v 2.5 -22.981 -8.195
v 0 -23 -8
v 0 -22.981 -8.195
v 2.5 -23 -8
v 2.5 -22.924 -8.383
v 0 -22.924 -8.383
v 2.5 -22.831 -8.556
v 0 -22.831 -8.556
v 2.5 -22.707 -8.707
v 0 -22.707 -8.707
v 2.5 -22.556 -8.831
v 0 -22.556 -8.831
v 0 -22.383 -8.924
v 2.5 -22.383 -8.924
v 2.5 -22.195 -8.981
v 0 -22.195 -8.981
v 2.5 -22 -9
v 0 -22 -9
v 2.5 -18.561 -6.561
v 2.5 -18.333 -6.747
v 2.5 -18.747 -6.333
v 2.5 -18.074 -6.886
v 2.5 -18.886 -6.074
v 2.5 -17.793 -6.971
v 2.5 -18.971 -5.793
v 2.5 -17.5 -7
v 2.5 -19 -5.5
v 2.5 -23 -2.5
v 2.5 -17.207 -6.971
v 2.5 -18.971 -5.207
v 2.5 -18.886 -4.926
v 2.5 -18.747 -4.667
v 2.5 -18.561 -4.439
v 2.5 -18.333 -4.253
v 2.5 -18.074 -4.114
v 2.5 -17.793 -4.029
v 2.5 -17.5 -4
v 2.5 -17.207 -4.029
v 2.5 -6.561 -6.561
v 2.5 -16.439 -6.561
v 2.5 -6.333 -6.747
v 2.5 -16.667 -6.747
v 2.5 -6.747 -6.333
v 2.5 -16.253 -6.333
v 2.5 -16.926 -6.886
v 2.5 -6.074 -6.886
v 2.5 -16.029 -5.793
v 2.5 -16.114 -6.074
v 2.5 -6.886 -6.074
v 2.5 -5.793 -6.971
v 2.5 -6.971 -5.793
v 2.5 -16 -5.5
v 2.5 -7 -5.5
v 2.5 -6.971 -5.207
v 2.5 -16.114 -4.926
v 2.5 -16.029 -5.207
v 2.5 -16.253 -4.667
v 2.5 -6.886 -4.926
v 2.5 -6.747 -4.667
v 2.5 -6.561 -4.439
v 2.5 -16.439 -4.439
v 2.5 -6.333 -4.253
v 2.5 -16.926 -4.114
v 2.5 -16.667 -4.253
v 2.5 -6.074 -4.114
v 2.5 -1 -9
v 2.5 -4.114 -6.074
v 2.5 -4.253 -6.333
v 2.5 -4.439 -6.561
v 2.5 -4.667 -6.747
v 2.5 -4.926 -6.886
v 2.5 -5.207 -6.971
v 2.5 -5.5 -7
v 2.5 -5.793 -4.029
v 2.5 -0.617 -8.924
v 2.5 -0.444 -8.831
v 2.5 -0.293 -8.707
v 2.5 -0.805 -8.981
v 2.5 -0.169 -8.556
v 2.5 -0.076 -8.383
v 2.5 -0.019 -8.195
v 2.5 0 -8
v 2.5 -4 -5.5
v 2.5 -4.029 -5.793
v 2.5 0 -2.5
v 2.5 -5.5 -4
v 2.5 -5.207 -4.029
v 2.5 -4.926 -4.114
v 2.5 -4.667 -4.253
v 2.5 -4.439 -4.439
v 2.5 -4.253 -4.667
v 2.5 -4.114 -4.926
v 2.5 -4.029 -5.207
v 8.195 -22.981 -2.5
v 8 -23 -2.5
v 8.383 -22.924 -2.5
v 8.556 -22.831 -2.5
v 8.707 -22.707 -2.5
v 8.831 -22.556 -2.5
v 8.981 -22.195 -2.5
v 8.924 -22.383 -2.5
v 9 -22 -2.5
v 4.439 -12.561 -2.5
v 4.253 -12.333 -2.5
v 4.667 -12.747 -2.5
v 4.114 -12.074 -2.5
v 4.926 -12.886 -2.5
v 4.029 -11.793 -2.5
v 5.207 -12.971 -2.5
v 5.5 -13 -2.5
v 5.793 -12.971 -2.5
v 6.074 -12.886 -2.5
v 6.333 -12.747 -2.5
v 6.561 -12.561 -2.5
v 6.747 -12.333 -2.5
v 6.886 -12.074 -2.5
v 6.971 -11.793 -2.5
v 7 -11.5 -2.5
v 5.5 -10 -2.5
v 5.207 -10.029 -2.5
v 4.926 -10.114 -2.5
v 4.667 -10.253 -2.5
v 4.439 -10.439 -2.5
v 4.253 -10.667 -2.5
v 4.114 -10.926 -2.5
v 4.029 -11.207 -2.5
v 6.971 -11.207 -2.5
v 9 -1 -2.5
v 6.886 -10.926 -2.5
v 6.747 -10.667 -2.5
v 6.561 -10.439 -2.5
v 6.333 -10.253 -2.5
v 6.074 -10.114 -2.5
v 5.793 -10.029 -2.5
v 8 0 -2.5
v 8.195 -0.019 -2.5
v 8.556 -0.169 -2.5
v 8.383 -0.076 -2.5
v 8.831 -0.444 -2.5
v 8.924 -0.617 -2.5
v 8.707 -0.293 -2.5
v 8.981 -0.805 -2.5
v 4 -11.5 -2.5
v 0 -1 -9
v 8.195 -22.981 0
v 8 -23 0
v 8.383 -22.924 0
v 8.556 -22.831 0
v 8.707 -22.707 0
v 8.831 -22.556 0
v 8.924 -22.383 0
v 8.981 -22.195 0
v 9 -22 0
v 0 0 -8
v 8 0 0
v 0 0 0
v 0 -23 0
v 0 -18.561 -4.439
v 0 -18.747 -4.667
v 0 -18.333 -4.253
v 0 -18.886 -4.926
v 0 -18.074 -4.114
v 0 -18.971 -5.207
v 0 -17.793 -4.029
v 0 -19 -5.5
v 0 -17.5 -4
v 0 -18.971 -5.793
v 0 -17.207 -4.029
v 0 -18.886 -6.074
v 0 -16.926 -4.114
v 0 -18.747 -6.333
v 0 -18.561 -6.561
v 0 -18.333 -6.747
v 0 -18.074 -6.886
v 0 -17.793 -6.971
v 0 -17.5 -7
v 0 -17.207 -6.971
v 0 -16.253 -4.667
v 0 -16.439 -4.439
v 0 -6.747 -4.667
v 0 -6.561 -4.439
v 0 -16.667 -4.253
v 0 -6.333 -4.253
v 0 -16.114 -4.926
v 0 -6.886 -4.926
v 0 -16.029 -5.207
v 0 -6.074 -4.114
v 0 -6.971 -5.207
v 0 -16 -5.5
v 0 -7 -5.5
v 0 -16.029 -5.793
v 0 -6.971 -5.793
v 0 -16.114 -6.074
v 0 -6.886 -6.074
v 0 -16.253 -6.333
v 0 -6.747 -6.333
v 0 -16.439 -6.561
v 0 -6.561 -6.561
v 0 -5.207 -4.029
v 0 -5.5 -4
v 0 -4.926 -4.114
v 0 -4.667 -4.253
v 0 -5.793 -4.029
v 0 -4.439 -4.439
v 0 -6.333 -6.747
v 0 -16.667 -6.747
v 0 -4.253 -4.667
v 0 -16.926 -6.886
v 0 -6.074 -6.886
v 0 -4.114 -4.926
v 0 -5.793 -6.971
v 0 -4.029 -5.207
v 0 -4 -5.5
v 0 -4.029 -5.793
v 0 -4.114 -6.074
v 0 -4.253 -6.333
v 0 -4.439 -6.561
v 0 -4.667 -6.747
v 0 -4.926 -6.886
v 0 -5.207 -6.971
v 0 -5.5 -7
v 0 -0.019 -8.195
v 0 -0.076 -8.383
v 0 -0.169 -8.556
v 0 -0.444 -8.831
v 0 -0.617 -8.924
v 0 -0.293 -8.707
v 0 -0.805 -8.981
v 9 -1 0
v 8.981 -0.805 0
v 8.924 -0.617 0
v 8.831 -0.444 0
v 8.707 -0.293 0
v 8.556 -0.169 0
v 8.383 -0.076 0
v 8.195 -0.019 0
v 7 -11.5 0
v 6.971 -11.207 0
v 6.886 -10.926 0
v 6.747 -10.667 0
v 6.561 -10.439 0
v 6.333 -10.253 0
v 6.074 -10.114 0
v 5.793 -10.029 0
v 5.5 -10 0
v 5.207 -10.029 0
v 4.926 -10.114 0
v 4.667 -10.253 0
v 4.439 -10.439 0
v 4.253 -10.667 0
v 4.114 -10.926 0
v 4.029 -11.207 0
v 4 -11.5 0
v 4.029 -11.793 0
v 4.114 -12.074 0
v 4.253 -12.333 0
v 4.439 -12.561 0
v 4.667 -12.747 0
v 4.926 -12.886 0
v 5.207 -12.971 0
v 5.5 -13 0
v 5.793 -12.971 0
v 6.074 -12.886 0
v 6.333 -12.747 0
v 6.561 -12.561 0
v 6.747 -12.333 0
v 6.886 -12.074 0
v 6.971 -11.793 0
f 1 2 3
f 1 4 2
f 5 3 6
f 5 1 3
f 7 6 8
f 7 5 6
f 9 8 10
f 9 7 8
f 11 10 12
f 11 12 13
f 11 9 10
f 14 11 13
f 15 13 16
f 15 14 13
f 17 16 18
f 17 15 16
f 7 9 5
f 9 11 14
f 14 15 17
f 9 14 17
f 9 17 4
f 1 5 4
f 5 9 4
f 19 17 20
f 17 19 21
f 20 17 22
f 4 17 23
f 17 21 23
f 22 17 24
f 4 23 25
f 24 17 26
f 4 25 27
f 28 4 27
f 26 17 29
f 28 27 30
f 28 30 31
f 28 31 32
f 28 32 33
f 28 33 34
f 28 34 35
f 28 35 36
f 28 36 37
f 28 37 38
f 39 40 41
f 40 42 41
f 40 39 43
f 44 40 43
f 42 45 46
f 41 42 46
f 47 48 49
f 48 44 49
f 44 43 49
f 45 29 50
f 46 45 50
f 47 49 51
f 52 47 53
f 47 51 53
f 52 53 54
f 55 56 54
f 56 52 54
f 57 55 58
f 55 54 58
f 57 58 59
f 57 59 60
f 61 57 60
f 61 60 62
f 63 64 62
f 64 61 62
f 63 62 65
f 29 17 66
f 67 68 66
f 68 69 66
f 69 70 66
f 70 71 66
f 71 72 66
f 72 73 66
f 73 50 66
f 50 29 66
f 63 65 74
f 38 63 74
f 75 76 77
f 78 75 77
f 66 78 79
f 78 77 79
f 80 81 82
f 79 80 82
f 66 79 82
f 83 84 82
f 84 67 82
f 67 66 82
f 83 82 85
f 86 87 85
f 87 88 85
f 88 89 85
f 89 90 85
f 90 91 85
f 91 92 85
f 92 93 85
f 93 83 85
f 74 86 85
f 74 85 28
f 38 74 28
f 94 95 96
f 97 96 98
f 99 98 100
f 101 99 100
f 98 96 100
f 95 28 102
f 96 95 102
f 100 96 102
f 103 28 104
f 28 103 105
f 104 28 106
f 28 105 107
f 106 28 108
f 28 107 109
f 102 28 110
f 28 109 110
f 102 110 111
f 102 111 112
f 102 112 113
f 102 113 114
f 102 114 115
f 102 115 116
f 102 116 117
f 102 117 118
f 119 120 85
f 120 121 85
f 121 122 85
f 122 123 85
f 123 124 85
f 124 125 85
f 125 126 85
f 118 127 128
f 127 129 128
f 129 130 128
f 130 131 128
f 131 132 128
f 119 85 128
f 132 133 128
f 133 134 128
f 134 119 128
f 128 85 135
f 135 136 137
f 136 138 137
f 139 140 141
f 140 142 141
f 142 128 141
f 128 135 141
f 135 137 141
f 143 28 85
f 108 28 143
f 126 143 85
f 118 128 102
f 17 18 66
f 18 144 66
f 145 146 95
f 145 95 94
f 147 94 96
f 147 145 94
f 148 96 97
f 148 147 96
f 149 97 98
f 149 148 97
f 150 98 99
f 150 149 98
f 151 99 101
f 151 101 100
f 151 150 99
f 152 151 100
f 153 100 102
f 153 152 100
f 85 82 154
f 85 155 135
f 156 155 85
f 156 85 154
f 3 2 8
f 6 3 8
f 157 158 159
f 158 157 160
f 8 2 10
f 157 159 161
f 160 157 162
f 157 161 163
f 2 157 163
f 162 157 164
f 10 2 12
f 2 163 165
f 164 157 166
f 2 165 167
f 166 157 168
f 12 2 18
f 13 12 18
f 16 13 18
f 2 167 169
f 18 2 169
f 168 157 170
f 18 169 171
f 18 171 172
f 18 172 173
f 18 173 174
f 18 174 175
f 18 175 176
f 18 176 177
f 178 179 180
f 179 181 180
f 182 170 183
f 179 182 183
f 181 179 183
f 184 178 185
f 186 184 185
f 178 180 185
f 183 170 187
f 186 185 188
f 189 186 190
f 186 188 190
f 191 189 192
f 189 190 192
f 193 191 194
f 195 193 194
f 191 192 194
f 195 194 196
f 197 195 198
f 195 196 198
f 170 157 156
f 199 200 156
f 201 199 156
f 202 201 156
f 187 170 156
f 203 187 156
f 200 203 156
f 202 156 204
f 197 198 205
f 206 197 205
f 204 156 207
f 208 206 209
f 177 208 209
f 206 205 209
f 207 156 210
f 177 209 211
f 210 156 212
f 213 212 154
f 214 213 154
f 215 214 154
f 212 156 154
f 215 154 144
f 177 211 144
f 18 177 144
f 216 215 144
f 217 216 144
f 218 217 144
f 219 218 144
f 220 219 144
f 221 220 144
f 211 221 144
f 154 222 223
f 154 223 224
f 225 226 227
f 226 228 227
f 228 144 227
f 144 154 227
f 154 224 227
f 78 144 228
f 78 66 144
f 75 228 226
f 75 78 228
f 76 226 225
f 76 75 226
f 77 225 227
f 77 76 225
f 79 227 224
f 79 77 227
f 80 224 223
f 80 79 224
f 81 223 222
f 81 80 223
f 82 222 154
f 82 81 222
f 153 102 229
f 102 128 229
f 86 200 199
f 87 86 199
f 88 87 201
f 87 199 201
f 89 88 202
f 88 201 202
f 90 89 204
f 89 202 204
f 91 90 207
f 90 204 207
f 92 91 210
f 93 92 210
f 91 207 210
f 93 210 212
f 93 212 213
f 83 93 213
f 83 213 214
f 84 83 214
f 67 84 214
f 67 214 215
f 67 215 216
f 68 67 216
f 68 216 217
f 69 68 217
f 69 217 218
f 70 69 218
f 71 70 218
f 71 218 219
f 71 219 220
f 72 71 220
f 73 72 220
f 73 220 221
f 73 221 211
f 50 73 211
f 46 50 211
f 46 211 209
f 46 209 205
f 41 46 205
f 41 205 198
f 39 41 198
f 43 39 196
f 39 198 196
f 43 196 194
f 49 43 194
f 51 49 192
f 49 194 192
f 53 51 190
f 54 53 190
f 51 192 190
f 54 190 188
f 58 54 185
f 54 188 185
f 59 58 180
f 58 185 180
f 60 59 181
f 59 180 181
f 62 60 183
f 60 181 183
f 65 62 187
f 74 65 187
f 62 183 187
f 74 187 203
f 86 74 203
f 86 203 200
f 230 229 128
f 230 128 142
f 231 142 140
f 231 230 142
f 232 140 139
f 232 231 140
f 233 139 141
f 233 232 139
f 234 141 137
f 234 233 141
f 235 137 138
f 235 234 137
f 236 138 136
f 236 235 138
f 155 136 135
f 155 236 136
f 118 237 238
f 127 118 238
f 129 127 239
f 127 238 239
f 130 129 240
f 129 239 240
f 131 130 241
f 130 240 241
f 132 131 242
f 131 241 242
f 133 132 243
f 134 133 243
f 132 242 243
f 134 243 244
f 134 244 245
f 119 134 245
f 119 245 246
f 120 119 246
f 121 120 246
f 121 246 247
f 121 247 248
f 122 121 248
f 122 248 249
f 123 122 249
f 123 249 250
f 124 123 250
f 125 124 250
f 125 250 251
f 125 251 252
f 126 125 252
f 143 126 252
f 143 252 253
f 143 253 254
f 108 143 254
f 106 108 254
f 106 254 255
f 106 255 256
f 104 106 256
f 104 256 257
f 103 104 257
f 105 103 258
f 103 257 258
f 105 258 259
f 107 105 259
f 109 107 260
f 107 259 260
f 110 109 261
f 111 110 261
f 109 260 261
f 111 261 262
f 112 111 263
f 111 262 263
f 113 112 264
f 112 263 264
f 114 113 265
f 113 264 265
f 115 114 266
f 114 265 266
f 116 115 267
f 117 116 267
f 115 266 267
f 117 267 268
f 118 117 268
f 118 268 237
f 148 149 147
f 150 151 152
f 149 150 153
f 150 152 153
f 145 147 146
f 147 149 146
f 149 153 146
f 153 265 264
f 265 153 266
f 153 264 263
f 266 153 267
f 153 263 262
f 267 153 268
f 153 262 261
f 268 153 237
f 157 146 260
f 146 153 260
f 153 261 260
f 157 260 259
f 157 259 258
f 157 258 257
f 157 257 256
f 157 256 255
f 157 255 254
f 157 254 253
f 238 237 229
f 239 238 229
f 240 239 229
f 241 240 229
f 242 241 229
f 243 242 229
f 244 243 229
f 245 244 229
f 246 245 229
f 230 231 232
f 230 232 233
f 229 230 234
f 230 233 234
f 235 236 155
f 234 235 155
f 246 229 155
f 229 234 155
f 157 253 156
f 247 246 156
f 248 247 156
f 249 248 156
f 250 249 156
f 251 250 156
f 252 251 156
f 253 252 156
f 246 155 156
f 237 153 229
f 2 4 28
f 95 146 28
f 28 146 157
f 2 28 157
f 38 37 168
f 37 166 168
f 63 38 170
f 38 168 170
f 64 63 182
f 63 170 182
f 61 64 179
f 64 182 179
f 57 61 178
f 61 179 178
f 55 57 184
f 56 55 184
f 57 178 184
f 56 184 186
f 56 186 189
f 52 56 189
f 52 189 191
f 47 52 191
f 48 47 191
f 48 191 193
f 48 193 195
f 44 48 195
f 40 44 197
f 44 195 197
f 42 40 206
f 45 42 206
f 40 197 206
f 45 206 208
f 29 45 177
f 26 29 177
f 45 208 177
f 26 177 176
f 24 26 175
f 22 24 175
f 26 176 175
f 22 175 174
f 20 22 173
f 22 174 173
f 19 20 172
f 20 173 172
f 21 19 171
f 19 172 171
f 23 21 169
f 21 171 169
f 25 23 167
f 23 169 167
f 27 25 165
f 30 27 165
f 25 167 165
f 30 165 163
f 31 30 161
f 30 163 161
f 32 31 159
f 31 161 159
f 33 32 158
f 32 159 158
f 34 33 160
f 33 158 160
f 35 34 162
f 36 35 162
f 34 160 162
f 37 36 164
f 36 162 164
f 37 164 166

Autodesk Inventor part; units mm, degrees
ref_plane "YZ Plane" through (0, 0, 0) normal (1, 0, 0) x (0, 1, 0)
ref_plane "XZ Plane" through (0, 0, 0) normal (0, 1, 0) x (-1, 0, 0)
ref_plane "XY Plane" through (0, 0, 0) normal (0, 0, 1) x (1, 0, 0)
sketch "Sketch1" plane through (0, 0, 0) normal (0, 0, 1) x (1, 0, 0)
  point P0 (0, 0)
sketch "Sketch2" plane through (0, 0, 0) normal (0, 1, 0) x (-1, 0, 0)
  line L0 (0, 0) -> (0, -9)
  line L1 (0, -9) -> (-2.5, -9)
  line L2 (-2.5, -9) -> (-2.5, -2.5)
  line L3 (-2.5, -2.5) -> (-9, -2.5)
  line L4 (-9, -2.5) -> (-9, 0)
  line L5 (-9, 0) -> (0, 0)
  dimension "d0" = 9
  dimension "d1" = 2.5
  dimension "d2" = 9
  dimension "d3" = 2.5
extrude "Extrusion1" add sketch "Sketch2" against normal blind 23
sketch "Sketch3" plane through (0, 0, 0) normal (0, 0, 1) x (1, 0, 0)
  circle A0 centre (5.5, -11.5) radius 1.5
  line L0 (0, 0) -> (9, 0) projected
  line L1 (0, 0) -> (0, -23) projected
  dimension "d6" = 3
  dimension "d7" = 11.5
  dimension "d8" = 5.5
extrude "Extrusion2" cut sketch "Sketch3" against normal blind 23
sketch "Sketch4" plane through (0, 0, -9) normal (-1, 0, 0) x (0, 0, 1)
  circle A0 centre (3.5, -5.5) radius 1.5
  circle A1 centre (3.5, -17.5) radius 1.5
  line L0 (0, 0) -> (9, 0) projected
  line L1 (9, -23) -> (0, -23) projected
  line L2 (9, 0) -> (9, -23) projected
  dimension "d11" = 3
  dimension "d12" = 3
  dimension "d13" = 5.5
  dimension "d14" = 5.5
  dimension "d15" = 12
  dimension "d16" = 5.5
extrude "Extrusion3" cut sketch "Sketch4" against normal blind 23
fillet "Fillet1" radius 1 4 edges at (1.25, 0, -9) (9, 0, -1.25) (9, -23, -1.25) (1.25, -23, -9)
